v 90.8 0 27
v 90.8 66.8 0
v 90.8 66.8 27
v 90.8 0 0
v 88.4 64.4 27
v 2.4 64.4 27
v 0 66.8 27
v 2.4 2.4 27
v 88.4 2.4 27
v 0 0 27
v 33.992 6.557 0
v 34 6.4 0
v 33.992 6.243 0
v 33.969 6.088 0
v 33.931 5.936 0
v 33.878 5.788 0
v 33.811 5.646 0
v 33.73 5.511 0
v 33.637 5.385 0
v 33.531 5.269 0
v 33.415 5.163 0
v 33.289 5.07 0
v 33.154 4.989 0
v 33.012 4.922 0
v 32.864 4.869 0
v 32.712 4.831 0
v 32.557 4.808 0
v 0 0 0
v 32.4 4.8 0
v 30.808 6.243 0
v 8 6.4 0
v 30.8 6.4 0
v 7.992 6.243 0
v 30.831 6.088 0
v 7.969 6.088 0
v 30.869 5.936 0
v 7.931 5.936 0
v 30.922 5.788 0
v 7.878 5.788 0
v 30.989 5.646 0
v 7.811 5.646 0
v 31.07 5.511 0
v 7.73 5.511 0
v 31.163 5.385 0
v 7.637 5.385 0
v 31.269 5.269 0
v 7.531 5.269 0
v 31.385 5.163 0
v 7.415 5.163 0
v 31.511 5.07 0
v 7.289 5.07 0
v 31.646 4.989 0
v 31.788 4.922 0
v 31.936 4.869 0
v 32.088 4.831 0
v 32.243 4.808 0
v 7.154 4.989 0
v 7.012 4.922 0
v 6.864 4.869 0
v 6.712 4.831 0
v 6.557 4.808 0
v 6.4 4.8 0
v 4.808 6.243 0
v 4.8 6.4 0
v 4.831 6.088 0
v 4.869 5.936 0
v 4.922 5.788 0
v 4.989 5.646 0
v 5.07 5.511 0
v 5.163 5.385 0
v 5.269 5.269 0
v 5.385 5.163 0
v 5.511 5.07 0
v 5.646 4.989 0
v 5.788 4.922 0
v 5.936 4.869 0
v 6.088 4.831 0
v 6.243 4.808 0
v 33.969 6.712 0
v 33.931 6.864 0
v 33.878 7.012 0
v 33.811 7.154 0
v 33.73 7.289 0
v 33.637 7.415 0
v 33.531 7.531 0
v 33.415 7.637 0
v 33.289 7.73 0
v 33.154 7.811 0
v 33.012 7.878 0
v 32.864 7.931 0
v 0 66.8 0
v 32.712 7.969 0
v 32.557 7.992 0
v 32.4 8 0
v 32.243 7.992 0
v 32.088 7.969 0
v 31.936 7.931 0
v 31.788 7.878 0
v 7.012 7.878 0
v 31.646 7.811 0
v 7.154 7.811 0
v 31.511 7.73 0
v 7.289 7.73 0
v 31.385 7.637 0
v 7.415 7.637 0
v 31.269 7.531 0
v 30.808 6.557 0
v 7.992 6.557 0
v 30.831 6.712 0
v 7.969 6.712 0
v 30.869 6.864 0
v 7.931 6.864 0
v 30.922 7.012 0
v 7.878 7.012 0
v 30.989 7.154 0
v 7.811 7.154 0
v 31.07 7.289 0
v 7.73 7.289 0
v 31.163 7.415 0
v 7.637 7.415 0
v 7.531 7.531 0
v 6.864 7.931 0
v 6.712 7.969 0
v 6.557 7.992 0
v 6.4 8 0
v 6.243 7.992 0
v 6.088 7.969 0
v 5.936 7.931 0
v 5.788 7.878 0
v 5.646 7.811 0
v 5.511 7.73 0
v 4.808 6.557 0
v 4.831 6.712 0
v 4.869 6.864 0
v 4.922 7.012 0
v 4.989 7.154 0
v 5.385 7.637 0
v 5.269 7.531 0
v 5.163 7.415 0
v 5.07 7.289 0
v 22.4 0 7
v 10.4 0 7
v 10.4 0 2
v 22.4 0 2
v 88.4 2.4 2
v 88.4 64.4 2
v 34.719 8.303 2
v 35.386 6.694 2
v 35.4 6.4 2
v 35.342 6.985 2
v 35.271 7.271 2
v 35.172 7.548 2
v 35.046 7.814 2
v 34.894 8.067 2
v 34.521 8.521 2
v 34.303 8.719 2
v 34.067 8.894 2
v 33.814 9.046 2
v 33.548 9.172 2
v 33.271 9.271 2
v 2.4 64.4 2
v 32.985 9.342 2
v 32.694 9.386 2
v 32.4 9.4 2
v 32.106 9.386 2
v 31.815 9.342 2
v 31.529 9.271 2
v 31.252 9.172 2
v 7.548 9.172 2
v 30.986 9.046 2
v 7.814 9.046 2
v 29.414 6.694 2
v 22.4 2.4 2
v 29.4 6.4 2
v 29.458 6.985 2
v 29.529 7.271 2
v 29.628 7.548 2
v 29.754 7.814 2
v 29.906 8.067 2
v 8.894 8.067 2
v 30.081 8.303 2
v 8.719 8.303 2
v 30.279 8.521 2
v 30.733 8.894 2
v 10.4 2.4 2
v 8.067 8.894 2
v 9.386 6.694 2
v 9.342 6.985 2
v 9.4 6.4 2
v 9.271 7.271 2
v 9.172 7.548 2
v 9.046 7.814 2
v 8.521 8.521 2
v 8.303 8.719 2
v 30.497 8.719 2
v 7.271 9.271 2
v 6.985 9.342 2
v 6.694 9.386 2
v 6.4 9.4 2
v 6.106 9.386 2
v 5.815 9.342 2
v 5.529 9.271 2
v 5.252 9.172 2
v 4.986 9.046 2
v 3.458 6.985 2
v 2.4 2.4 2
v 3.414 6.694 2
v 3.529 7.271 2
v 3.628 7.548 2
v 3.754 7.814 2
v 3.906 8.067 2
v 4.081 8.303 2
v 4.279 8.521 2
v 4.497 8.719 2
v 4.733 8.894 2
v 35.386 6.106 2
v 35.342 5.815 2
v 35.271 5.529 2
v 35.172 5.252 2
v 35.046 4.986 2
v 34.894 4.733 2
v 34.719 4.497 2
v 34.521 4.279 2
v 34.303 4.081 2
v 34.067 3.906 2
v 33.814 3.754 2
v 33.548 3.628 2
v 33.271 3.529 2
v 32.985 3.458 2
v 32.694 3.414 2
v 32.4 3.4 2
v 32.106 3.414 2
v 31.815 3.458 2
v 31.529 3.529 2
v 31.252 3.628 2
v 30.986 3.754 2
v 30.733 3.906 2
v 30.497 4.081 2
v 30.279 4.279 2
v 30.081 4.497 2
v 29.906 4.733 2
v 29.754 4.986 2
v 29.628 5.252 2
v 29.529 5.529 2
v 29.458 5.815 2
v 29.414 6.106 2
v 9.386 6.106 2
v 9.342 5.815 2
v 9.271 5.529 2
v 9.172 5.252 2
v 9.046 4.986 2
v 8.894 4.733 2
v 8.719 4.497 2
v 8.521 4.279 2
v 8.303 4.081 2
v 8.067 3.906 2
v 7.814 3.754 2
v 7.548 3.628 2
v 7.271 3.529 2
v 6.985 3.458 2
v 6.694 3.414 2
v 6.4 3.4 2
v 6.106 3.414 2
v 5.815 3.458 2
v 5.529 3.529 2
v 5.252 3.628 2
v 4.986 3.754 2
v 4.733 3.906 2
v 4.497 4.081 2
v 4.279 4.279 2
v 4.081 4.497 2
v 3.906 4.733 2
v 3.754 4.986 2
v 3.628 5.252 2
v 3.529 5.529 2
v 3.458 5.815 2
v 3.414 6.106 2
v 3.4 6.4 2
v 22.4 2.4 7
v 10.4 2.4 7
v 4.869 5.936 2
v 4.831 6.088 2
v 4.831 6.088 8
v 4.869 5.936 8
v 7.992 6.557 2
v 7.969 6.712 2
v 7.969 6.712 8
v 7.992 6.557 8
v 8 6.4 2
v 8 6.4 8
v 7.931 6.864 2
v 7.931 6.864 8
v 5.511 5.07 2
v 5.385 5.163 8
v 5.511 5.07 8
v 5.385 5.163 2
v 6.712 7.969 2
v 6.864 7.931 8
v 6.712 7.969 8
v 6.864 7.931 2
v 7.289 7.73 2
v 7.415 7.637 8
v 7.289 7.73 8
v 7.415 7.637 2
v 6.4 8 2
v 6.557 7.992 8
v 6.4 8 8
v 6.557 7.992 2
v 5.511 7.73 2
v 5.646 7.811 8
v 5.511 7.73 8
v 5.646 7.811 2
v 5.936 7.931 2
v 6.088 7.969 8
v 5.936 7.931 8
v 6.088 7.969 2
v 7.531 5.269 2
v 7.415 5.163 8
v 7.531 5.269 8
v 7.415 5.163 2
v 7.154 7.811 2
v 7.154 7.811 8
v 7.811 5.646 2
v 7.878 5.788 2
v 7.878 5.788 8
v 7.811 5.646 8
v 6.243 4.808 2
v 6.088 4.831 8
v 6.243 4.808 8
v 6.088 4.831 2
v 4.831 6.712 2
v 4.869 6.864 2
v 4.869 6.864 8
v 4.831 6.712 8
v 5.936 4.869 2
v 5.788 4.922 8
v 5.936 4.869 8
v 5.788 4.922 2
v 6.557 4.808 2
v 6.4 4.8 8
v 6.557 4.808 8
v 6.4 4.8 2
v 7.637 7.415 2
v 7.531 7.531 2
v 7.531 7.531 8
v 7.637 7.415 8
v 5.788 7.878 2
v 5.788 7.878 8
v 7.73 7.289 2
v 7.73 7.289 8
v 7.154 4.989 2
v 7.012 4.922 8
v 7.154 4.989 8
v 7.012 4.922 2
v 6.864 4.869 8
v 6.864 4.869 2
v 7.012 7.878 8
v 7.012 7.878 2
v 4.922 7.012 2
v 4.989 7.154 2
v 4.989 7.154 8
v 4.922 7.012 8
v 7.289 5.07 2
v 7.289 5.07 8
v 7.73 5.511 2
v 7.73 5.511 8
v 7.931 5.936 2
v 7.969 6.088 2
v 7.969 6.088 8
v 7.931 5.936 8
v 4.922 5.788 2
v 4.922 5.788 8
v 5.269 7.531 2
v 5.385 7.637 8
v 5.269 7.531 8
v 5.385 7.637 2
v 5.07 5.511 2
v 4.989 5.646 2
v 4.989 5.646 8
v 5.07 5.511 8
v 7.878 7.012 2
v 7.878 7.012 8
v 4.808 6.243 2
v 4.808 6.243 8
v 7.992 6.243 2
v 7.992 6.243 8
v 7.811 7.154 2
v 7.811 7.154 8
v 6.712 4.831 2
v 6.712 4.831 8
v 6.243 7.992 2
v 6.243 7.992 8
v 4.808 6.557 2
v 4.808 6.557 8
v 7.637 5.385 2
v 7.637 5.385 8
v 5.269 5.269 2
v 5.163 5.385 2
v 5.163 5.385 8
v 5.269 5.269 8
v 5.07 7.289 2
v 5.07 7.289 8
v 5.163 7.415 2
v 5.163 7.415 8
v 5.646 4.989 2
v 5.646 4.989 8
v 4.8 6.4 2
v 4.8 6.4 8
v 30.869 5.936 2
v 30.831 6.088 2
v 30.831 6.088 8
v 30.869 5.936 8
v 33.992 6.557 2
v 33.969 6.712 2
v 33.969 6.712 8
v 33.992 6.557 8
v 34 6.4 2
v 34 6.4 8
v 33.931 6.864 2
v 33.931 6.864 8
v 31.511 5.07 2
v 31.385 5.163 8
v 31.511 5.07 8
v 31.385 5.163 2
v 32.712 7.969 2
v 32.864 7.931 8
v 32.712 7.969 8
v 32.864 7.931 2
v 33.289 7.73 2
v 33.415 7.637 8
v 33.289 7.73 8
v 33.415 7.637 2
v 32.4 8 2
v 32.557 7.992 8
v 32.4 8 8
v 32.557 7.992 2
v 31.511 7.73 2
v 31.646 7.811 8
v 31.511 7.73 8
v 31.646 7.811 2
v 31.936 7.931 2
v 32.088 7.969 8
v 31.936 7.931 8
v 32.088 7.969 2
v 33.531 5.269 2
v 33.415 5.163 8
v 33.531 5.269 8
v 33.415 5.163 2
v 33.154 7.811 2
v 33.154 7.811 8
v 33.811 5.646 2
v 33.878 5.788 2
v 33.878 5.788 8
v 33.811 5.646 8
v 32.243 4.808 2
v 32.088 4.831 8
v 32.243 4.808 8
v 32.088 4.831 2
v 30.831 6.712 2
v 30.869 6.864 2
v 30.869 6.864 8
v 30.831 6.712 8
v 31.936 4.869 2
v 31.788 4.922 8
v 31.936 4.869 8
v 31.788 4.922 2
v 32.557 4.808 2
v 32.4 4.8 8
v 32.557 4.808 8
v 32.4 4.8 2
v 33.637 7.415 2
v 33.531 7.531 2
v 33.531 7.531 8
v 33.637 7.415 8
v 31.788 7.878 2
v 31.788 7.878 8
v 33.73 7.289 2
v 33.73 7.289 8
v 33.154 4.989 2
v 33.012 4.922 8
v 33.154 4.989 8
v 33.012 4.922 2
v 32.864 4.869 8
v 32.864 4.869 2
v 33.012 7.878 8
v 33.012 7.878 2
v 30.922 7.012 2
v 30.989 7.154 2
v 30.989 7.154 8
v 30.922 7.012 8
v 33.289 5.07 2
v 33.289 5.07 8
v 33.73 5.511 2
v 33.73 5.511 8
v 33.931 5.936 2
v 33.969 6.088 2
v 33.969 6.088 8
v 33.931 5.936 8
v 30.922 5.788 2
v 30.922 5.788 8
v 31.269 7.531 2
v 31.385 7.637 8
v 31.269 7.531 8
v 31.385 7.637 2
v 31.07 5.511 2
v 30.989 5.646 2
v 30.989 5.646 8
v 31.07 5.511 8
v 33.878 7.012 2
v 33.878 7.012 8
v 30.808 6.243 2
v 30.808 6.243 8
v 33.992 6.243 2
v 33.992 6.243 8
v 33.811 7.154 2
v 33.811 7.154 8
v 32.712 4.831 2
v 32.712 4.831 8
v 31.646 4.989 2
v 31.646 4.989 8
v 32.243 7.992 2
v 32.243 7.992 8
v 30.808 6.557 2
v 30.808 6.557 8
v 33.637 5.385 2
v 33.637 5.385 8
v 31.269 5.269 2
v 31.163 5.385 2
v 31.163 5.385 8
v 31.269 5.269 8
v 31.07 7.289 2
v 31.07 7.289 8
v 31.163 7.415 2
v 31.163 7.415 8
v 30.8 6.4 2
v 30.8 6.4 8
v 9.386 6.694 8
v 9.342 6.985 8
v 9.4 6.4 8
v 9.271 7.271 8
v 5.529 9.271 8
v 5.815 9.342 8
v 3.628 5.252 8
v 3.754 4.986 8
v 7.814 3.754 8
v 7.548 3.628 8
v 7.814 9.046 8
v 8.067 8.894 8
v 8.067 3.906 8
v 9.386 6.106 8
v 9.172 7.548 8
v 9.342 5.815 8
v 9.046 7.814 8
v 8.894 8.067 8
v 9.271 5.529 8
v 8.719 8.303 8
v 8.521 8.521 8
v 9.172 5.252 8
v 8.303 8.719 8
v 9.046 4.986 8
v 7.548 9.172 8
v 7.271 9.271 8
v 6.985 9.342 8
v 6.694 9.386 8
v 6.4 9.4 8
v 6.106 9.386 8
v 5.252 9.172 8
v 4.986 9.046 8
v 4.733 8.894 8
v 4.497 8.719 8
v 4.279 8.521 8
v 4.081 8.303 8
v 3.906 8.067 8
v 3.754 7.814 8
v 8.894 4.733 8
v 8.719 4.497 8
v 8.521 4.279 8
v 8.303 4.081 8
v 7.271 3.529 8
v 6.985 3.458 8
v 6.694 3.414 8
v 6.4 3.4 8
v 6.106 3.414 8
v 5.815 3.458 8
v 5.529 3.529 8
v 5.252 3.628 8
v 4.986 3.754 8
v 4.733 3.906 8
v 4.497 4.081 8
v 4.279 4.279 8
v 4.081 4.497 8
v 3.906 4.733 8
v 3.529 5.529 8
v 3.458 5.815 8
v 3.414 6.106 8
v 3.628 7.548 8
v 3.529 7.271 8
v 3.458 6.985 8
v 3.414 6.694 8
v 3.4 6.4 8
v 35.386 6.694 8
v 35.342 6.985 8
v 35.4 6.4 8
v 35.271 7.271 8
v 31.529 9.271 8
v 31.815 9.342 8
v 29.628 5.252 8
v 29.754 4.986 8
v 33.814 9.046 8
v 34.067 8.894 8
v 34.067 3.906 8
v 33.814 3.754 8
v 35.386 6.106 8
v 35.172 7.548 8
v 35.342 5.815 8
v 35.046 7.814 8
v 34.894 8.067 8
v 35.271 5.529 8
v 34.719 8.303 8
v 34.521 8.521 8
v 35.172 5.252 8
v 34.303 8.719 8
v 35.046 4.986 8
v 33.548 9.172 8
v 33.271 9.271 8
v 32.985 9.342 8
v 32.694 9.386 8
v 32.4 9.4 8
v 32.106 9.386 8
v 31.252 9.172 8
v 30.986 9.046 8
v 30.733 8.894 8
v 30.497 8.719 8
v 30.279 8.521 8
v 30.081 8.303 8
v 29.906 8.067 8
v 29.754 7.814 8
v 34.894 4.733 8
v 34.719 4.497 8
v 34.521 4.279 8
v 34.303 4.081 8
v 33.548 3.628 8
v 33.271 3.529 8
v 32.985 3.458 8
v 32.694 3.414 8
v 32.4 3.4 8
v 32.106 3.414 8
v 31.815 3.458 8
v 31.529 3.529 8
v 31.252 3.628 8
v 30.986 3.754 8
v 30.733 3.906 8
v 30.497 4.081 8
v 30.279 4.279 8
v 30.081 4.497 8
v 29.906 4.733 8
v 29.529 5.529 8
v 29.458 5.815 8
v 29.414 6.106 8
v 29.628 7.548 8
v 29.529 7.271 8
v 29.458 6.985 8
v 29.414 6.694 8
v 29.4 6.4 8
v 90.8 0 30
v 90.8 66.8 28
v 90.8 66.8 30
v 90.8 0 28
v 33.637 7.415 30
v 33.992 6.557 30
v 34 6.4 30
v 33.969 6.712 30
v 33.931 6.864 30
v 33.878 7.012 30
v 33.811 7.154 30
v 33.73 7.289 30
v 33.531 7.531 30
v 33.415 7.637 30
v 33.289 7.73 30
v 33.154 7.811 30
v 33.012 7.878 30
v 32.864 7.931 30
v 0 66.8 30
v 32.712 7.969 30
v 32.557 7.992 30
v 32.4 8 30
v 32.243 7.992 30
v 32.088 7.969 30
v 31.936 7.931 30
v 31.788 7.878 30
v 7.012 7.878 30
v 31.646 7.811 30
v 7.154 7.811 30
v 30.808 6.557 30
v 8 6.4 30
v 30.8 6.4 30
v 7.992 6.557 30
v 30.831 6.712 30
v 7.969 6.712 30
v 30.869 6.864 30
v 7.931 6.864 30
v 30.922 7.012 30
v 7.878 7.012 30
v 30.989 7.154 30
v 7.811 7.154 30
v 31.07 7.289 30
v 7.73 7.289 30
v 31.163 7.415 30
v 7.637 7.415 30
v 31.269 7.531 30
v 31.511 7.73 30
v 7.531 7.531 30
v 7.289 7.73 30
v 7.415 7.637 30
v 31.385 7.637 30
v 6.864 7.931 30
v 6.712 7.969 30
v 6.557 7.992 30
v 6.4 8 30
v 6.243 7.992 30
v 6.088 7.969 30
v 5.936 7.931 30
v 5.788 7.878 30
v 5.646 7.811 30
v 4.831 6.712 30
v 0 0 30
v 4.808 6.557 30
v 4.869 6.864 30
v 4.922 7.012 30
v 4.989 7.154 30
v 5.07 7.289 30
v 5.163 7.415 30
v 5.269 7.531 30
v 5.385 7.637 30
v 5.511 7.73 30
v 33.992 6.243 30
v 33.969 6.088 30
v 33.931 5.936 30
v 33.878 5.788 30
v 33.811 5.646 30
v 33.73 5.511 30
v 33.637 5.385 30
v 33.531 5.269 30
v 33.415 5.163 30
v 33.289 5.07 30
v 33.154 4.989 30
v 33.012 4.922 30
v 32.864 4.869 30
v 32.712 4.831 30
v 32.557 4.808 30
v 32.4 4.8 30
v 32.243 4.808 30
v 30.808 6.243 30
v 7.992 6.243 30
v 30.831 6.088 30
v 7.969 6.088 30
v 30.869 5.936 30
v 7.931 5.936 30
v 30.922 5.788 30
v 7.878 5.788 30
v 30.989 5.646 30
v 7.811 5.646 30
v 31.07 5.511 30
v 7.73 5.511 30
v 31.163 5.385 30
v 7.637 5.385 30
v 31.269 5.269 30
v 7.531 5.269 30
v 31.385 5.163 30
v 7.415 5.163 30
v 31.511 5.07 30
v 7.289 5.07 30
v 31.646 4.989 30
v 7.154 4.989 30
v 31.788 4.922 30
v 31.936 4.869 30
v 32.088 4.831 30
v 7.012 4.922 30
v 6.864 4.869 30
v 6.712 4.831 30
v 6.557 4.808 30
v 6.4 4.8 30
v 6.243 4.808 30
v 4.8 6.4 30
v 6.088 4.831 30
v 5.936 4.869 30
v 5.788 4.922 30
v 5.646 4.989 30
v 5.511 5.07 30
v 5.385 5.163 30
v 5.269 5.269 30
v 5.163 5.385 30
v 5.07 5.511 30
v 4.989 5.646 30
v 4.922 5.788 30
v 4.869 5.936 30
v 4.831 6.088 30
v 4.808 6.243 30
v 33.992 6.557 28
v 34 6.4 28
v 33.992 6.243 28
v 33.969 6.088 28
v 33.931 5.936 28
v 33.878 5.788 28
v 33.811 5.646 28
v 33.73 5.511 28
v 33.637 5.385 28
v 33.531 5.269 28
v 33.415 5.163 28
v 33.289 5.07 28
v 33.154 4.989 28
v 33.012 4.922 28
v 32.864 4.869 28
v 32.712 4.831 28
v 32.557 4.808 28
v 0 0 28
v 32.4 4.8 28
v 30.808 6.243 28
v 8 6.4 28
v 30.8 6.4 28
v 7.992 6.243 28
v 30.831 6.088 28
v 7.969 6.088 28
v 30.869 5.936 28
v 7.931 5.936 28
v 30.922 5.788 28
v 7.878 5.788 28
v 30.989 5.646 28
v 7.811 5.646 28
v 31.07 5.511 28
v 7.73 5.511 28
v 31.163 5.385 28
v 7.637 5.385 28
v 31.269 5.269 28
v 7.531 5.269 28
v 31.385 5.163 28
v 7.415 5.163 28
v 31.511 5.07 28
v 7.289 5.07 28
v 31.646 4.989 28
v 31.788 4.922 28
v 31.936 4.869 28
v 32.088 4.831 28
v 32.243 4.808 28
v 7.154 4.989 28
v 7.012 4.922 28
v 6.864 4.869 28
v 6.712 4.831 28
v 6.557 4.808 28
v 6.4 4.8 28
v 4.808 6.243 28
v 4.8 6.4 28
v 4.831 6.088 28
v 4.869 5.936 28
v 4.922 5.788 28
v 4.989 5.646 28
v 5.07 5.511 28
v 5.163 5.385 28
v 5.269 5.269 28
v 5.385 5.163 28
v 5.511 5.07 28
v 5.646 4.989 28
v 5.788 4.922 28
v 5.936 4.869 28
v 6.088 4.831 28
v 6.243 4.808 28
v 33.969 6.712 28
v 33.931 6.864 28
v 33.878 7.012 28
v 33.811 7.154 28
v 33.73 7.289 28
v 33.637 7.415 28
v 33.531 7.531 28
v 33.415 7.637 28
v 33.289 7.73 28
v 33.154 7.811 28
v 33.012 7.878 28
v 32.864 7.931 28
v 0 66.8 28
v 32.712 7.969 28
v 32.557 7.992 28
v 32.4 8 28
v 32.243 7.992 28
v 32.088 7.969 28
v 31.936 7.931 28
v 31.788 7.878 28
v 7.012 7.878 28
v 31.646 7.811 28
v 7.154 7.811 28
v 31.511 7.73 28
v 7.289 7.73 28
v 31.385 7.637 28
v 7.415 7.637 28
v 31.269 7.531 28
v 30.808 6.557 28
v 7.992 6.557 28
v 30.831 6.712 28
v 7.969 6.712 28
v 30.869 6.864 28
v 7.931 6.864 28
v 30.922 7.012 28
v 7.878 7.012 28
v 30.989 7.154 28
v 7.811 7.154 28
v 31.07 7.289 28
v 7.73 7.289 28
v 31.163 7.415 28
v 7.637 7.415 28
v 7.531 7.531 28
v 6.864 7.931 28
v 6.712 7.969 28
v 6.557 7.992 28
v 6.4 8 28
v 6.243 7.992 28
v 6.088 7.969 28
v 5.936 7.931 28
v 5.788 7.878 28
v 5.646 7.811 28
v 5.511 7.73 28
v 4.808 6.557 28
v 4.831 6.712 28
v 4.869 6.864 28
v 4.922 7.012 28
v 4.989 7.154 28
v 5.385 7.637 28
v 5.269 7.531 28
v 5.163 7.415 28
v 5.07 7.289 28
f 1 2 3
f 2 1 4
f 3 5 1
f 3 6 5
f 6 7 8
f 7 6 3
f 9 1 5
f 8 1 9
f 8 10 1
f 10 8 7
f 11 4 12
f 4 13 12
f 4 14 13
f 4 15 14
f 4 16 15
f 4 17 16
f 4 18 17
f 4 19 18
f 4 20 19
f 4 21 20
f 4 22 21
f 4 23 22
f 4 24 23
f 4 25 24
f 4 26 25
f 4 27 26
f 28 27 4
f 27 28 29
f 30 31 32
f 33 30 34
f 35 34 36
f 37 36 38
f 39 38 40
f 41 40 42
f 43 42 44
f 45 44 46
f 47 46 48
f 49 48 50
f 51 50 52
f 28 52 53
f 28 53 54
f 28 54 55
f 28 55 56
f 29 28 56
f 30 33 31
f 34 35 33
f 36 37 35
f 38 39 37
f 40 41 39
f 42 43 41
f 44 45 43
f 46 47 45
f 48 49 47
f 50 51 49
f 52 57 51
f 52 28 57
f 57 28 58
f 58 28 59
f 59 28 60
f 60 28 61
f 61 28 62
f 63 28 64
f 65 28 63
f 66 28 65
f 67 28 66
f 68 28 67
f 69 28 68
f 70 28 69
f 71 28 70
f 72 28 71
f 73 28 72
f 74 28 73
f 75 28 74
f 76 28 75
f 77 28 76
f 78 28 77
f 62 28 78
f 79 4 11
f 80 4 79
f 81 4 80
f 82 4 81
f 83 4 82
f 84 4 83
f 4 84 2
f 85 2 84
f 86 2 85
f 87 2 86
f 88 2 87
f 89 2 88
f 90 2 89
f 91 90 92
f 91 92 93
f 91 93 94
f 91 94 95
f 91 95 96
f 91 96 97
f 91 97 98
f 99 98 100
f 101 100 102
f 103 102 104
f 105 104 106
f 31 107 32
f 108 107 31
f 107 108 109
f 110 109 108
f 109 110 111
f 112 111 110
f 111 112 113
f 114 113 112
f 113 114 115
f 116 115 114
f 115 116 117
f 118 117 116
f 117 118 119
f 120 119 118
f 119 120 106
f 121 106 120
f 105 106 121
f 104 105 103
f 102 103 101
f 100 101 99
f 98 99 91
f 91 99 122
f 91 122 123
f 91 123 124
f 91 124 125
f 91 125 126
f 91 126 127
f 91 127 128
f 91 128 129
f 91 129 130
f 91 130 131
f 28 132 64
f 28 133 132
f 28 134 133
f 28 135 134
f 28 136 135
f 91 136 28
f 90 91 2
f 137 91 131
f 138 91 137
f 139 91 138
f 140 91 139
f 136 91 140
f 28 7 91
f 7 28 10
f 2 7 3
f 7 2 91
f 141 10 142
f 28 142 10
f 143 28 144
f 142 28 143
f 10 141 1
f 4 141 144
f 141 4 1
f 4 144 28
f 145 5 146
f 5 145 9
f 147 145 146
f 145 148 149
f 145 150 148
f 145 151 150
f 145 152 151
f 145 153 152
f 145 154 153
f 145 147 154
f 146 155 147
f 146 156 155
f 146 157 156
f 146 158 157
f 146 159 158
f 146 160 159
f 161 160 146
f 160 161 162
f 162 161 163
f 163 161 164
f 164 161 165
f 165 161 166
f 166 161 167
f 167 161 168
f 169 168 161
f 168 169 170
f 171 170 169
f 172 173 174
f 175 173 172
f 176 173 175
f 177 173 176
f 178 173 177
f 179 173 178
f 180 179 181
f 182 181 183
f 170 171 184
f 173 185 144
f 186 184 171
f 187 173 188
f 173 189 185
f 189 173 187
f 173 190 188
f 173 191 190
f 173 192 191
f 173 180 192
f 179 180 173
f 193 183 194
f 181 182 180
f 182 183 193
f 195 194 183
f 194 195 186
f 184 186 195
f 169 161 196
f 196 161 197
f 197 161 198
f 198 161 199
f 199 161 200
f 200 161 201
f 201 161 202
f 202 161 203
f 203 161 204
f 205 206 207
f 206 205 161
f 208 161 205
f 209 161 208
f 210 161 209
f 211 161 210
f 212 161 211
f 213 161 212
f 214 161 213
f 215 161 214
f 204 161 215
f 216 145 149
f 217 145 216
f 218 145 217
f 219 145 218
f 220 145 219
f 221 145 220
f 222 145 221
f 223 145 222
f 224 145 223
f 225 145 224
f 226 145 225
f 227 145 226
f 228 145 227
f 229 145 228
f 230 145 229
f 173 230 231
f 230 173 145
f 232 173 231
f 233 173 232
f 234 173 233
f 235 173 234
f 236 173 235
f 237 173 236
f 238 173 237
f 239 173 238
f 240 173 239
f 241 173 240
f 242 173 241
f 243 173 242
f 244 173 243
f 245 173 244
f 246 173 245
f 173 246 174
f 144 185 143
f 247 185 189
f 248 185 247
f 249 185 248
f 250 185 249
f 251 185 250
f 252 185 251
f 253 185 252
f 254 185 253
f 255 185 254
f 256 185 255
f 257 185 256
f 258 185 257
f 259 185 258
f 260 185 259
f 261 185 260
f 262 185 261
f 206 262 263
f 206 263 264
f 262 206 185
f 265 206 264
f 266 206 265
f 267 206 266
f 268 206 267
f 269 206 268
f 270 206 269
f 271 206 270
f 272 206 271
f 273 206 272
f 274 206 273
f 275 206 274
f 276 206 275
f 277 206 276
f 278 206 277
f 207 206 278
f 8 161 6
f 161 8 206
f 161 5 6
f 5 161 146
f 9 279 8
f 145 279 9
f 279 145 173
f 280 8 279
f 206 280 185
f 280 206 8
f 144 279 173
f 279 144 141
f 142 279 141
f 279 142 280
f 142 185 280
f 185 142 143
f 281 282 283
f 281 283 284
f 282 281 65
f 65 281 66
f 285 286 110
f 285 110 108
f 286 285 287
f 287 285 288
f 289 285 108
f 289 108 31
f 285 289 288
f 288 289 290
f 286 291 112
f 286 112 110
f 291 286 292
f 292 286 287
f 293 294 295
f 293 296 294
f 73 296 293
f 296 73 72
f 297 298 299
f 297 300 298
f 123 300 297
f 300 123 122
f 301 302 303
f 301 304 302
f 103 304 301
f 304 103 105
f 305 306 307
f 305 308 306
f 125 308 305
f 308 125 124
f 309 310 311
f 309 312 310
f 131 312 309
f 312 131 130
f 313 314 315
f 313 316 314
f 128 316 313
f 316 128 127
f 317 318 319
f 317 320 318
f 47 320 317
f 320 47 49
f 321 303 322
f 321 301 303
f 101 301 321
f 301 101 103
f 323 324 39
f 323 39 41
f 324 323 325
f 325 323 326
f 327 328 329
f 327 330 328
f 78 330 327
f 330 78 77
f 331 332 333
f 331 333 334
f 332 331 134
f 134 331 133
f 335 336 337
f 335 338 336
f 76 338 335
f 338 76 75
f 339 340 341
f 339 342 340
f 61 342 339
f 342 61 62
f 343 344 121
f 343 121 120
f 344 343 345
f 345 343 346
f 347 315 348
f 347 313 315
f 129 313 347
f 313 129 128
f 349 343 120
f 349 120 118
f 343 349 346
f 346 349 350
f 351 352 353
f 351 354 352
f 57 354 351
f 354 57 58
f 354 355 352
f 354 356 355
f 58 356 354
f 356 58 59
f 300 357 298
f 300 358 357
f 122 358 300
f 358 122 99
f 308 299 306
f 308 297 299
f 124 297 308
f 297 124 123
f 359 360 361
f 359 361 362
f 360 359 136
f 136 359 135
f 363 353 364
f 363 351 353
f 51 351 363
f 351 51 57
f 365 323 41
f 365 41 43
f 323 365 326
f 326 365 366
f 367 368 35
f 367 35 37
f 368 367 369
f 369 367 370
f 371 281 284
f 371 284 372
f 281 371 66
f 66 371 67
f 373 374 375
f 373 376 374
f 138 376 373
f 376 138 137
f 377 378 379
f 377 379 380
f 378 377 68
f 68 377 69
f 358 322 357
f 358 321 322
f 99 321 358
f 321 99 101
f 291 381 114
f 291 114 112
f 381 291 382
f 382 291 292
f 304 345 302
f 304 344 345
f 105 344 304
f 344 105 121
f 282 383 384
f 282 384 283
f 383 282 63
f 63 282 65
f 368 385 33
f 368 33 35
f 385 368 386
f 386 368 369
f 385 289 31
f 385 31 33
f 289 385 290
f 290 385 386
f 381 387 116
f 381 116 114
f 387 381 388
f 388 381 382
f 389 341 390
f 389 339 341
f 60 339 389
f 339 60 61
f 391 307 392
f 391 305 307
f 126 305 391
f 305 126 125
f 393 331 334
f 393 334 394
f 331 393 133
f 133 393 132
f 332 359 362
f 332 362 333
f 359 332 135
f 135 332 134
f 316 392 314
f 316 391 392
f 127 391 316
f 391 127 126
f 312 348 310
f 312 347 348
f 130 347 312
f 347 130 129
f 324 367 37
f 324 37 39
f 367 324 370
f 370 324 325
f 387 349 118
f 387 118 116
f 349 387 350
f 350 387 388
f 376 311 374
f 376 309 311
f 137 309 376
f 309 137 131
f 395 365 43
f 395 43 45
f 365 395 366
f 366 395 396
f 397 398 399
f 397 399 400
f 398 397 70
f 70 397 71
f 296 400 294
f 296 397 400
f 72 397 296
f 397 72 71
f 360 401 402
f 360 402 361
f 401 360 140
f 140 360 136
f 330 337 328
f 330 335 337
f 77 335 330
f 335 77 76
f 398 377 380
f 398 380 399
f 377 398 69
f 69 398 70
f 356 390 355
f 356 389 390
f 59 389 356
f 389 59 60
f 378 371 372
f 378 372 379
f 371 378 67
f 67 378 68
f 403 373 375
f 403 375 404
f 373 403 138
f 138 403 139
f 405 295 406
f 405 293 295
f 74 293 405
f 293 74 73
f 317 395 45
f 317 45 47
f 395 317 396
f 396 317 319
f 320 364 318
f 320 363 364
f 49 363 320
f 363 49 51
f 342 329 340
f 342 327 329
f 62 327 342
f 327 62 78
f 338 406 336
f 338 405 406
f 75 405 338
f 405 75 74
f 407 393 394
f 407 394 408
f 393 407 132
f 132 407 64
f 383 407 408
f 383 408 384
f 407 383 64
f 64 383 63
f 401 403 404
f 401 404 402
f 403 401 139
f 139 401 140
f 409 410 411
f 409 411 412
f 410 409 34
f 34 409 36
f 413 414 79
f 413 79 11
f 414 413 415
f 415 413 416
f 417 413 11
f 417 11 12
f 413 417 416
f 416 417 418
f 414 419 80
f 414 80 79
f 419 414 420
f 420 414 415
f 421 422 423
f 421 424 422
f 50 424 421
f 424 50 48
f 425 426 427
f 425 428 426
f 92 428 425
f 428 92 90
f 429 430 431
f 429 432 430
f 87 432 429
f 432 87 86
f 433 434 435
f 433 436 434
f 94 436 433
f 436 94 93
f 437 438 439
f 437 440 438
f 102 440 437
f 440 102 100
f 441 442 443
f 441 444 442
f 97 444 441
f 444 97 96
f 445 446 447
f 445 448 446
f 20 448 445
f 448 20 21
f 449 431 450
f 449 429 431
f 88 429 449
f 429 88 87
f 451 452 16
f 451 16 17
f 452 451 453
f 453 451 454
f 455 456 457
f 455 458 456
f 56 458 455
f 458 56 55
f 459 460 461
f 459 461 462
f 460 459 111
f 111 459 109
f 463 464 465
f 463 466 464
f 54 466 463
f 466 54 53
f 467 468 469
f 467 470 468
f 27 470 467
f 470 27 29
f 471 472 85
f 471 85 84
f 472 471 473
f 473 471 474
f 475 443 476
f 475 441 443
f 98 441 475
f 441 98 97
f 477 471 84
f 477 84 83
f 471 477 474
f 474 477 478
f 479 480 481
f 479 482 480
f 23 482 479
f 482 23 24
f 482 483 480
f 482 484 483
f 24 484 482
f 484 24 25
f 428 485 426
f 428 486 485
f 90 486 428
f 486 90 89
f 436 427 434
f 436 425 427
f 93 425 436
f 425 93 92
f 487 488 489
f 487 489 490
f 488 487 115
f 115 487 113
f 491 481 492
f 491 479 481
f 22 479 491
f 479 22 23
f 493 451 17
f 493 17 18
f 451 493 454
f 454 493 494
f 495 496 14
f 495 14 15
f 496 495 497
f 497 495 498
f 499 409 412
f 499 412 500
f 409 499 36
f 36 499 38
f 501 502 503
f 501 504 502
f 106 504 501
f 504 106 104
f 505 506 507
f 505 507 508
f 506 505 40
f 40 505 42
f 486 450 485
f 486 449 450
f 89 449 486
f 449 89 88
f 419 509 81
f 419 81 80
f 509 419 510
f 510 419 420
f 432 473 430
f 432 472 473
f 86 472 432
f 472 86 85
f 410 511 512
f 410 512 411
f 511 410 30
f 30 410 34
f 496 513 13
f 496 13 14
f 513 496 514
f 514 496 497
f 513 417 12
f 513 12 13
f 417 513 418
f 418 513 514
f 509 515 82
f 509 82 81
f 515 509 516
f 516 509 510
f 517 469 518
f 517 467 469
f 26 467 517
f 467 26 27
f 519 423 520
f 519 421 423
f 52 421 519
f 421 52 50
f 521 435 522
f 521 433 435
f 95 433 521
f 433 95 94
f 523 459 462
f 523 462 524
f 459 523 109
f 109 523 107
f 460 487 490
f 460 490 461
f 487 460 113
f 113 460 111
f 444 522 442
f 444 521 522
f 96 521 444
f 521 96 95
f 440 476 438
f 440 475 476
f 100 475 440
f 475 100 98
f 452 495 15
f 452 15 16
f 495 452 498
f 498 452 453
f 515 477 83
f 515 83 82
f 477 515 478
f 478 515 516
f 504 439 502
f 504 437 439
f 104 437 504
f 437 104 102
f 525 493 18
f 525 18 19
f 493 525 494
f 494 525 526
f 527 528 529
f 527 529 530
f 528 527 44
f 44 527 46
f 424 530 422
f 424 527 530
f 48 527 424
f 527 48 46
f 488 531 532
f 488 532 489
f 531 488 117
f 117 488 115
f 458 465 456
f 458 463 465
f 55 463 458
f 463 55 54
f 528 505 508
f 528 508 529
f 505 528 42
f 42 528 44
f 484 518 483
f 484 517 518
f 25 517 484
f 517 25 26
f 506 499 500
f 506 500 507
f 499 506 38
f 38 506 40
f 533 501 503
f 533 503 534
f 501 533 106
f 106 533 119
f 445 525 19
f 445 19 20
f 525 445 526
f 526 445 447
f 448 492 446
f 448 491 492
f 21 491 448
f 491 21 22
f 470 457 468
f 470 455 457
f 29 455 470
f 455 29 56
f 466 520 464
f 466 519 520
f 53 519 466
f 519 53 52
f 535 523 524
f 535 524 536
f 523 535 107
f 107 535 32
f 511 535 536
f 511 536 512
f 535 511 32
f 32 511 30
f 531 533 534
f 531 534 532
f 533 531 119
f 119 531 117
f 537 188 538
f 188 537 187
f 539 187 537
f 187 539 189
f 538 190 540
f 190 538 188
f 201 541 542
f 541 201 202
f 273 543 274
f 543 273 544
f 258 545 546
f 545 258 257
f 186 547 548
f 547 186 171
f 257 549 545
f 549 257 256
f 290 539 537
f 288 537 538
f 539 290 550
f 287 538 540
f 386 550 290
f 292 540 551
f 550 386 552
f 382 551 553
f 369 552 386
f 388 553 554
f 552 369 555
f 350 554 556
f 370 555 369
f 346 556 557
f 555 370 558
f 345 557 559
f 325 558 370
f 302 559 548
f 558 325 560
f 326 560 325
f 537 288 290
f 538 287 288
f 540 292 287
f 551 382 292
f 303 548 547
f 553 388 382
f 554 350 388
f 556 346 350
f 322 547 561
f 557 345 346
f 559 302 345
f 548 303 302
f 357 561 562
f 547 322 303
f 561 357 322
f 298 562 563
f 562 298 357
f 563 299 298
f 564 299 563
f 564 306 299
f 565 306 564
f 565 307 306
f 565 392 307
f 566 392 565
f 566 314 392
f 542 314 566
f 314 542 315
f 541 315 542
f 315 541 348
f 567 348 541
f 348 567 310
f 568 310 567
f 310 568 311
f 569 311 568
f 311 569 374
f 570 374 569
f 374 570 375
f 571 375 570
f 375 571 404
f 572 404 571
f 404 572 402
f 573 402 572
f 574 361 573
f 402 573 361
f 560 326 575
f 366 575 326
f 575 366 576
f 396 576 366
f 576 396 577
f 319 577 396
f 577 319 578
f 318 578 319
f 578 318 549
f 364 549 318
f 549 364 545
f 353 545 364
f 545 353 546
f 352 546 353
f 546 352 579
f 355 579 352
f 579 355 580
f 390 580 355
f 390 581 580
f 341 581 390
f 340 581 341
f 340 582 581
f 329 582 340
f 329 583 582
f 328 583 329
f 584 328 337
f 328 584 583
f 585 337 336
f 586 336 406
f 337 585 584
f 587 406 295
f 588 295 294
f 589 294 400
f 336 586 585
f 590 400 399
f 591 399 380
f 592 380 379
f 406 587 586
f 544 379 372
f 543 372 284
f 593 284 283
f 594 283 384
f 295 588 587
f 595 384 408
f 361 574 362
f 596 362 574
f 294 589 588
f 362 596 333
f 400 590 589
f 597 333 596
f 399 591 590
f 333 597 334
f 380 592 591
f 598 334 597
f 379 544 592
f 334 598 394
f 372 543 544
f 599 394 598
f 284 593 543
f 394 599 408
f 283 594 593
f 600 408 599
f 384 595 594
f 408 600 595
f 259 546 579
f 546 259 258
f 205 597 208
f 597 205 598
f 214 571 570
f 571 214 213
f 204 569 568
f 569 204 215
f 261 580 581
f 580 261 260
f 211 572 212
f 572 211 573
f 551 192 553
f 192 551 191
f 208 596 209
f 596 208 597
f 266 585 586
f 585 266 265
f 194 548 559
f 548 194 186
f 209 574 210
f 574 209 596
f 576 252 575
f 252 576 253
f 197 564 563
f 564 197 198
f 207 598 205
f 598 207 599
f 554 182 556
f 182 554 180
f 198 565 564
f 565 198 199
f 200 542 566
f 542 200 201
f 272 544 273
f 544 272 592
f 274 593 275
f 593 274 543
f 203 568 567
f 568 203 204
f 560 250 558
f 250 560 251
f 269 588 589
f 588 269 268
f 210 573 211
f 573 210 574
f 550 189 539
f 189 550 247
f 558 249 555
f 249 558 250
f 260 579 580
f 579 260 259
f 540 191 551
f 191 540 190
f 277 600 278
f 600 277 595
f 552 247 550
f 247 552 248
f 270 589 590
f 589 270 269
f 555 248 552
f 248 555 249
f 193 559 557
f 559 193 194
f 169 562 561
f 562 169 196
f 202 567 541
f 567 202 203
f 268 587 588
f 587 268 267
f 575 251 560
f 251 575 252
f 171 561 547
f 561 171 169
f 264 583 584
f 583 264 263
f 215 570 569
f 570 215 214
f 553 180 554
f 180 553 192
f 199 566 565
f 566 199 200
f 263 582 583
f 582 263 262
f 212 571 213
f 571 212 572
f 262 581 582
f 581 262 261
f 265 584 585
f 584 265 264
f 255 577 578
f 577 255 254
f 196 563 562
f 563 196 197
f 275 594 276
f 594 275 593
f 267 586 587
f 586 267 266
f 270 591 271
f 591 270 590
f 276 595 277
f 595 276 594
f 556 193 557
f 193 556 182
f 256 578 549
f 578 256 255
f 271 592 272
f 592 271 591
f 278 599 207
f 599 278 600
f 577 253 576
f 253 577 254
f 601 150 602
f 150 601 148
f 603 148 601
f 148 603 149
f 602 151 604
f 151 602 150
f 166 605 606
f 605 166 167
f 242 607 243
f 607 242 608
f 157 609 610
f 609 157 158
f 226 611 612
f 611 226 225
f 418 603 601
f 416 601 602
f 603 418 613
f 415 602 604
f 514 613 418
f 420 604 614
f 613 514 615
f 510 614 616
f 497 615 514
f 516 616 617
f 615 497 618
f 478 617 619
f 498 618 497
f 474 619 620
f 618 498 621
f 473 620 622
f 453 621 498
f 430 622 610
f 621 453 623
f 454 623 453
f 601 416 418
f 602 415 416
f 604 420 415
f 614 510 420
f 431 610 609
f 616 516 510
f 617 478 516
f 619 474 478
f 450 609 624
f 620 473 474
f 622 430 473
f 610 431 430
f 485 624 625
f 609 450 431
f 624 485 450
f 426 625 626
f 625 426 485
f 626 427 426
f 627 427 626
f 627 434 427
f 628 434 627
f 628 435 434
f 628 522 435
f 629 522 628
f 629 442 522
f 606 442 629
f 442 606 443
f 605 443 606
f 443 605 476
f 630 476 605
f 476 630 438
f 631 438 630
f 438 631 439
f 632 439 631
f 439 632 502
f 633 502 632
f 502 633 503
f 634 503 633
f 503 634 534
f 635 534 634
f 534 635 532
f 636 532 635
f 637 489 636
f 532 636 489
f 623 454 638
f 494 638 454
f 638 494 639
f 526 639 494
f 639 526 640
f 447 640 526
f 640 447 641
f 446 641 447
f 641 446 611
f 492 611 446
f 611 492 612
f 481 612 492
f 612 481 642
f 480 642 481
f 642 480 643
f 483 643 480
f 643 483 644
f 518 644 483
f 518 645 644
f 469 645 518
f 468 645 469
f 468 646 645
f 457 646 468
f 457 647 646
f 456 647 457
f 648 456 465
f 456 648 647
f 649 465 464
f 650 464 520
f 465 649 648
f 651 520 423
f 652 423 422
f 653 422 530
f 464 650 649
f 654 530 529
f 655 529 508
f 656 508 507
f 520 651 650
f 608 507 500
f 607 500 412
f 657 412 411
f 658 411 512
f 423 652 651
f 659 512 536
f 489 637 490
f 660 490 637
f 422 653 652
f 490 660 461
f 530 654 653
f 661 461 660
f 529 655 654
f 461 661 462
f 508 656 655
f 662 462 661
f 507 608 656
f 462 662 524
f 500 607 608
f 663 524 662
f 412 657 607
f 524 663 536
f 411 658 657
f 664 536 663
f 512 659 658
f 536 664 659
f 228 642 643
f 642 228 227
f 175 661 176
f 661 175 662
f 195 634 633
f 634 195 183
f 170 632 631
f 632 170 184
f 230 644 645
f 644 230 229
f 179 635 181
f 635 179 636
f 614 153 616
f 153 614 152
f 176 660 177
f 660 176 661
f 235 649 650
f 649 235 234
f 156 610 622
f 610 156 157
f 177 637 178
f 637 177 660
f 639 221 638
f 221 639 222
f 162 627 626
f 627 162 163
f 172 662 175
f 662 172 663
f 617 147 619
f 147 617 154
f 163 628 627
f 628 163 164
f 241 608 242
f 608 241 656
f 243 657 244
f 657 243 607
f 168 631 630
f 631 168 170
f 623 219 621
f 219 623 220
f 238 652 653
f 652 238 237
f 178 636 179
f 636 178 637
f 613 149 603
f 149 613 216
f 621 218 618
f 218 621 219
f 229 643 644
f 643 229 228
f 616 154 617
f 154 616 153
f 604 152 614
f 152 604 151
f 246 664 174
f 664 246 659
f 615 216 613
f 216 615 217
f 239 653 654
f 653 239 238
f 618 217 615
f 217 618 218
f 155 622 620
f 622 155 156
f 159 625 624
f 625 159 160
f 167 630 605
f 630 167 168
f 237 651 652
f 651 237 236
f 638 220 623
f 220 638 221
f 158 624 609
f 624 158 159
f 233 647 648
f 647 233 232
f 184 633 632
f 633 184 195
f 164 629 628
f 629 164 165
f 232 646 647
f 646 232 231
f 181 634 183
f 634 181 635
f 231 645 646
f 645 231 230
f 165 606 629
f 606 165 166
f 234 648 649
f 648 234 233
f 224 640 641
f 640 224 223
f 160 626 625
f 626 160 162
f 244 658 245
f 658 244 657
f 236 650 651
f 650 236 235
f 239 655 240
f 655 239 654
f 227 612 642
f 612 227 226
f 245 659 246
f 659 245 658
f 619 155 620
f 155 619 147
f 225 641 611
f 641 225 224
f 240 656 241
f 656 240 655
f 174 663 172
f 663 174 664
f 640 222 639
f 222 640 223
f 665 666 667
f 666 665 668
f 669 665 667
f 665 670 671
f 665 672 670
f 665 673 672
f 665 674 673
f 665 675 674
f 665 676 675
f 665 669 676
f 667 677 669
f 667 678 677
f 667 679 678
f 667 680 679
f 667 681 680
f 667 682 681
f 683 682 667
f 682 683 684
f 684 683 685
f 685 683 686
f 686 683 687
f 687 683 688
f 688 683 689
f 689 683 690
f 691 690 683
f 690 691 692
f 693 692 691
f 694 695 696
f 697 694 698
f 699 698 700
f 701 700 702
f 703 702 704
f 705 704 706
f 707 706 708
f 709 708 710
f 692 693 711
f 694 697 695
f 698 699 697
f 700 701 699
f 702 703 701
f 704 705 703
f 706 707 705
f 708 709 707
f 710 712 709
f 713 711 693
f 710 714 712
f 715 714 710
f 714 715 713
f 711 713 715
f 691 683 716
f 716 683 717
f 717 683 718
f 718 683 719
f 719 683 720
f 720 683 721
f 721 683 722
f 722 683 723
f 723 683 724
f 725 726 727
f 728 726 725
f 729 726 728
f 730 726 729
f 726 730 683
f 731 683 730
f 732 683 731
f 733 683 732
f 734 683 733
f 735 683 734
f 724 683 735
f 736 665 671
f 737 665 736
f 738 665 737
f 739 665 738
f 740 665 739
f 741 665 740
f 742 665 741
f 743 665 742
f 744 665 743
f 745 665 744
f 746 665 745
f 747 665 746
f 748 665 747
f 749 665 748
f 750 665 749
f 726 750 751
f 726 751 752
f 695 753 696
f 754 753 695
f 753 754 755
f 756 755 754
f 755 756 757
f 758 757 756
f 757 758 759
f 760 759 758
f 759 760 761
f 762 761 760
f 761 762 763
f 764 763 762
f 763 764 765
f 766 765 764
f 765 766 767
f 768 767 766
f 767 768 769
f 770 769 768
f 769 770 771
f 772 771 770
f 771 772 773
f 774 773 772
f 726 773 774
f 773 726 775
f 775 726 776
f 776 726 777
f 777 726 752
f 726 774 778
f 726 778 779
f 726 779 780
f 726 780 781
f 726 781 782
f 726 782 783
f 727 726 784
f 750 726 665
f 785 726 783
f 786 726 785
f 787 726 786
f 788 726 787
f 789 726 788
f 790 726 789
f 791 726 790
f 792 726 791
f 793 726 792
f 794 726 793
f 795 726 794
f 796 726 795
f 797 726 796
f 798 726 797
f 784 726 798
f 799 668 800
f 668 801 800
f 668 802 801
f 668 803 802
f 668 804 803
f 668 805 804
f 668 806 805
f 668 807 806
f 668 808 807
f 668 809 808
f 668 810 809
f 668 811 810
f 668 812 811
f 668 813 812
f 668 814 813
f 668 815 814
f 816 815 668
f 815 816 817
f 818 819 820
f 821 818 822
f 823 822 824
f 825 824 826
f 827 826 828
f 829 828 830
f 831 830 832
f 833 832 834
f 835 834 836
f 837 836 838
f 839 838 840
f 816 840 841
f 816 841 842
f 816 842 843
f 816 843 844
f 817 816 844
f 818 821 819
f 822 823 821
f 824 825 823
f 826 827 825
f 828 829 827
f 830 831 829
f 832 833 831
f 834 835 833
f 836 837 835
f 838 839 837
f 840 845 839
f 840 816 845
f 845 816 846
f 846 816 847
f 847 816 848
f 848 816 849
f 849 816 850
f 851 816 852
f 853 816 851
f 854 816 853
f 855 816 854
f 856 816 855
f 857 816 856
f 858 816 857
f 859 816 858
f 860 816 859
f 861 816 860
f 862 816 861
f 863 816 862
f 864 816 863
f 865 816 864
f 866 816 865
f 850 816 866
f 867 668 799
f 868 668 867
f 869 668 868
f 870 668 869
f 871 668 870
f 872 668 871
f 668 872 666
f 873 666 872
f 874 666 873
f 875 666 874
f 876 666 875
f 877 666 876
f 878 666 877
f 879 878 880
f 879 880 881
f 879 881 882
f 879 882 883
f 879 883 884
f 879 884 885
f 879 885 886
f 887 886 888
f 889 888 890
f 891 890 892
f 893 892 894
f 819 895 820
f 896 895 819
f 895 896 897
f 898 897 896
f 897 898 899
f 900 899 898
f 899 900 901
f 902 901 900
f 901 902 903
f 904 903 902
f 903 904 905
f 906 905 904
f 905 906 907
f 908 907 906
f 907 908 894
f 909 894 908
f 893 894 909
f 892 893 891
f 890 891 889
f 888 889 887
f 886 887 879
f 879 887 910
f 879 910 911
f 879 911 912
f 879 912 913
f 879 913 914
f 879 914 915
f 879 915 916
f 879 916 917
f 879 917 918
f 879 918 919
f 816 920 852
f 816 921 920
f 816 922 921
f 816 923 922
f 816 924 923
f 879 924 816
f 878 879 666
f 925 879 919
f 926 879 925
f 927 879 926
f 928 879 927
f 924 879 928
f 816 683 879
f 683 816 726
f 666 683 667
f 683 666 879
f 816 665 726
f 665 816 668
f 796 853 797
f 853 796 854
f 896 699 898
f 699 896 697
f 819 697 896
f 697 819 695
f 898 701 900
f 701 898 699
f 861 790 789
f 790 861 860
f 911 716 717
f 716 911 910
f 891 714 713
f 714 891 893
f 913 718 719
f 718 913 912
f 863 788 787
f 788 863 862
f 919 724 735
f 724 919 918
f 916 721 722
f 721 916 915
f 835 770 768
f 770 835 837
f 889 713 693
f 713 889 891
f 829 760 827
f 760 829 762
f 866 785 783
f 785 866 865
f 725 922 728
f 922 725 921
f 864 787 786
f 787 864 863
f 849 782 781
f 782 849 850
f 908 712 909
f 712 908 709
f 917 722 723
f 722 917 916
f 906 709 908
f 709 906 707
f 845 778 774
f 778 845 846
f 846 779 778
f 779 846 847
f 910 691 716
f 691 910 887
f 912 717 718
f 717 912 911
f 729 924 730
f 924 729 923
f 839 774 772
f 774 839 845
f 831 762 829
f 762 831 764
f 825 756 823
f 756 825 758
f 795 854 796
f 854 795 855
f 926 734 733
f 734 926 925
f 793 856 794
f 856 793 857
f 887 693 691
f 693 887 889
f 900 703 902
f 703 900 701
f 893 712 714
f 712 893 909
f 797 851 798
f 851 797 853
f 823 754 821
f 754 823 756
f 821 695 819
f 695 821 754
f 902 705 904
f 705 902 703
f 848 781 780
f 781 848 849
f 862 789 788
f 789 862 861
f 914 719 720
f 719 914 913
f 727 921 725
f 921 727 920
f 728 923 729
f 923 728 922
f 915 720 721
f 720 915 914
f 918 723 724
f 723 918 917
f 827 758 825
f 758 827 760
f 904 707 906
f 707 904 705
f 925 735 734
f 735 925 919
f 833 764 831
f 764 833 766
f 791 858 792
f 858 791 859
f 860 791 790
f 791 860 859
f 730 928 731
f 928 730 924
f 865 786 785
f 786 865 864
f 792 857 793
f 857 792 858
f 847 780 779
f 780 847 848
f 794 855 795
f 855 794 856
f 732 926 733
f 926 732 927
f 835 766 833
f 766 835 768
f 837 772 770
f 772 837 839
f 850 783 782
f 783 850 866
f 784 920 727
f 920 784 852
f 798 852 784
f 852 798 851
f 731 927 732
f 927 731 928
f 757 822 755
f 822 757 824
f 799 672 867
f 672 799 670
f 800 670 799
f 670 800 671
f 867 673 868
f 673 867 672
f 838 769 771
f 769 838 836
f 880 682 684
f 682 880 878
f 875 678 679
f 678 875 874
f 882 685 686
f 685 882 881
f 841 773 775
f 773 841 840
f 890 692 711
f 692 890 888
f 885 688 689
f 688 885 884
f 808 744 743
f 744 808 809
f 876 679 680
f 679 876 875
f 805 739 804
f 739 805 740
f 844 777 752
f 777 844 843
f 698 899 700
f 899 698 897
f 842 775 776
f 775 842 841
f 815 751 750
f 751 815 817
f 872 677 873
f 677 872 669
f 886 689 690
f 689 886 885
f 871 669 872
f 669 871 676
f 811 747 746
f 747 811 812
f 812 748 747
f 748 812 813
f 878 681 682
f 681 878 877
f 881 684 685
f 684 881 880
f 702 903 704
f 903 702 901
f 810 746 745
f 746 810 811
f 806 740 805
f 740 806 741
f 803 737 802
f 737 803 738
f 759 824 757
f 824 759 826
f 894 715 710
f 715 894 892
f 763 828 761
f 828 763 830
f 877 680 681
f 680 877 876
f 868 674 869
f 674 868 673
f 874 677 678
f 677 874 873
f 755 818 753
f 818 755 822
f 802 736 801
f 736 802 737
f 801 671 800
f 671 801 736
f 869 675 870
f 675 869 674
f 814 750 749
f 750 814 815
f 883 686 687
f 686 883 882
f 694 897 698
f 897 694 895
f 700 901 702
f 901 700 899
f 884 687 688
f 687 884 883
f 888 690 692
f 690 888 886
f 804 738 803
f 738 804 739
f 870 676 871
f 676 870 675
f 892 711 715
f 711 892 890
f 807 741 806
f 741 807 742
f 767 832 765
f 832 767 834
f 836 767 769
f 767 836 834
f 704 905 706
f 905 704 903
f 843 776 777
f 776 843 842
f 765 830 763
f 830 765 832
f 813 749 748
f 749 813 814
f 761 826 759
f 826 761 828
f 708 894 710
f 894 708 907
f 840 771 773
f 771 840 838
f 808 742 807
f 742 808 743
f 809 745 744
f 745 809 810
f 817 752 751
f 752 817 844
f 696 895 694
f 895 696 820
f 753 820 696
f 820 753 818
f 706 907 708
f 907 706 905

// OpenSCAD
// Auto-generated by Mecha-Splicer
// enclosure=ctrl_box_6_enclosure

$fn = 64;

inner_w = 86.0;
inner_d = 62.0;
inner_h = 25.0;
wall = 2.4;
floor = 2.0;
lid_t = 2.0;
standoff_h = 6.0;
standoff_od = 6.0;
standoff_hole_d = 3.2;

module base() {
  union() {
    difference() {
      cube([90.8, 66.8, 27.0], center=false);
      translate([2.4, 2.4, 2.0]) cube([86.0, 62.0, 25.0], center=false);
    translate([10.4, 0, 2.0]) cube([12.0, 3.4, 5.0], center=false);
      translate([6.4, 6.4, -1]) cylinder(h=29.0, d=3.2, center=false);
      translate([32.4, 6.4, -1]) cylinder(h=29.0, d=3.2, center=false);
    }
    // Standoffs
    difference() {
      union() {
        translate([6.4, 6.4, 2.0]) cylinder(h=standoff_h, d=standoff_od, center=false);
        translate([32.4, 6.4, 2.0]) cylinder(h=standoff_h, d=standoff_od, center=false);
      }
      translate([6.4, 6.4, 1.0]) cylinder(h=standoff_h + 2, d=standoff_hole_d, center=false);
      translate([32.4, 6.4, 1.0]) cylinder(h=standoff_h + 2, d=standoff_hole_d, center=false);
    }
  }
}

module lid() {
  difference() {
    cube([90.8, 66.8, 2.0], center=false);
    translate([6.4, 6.4, -1]) cylinder(h=4.0, d=3.2, center=false);
    translate([32.4, 6.4, -1]) cylinder(h=4.0, d=3.2, center=false);
  }
}

module enclosure() {
  base();
  translate([0, 0, 28.0]) lid();
}
enclosure();
